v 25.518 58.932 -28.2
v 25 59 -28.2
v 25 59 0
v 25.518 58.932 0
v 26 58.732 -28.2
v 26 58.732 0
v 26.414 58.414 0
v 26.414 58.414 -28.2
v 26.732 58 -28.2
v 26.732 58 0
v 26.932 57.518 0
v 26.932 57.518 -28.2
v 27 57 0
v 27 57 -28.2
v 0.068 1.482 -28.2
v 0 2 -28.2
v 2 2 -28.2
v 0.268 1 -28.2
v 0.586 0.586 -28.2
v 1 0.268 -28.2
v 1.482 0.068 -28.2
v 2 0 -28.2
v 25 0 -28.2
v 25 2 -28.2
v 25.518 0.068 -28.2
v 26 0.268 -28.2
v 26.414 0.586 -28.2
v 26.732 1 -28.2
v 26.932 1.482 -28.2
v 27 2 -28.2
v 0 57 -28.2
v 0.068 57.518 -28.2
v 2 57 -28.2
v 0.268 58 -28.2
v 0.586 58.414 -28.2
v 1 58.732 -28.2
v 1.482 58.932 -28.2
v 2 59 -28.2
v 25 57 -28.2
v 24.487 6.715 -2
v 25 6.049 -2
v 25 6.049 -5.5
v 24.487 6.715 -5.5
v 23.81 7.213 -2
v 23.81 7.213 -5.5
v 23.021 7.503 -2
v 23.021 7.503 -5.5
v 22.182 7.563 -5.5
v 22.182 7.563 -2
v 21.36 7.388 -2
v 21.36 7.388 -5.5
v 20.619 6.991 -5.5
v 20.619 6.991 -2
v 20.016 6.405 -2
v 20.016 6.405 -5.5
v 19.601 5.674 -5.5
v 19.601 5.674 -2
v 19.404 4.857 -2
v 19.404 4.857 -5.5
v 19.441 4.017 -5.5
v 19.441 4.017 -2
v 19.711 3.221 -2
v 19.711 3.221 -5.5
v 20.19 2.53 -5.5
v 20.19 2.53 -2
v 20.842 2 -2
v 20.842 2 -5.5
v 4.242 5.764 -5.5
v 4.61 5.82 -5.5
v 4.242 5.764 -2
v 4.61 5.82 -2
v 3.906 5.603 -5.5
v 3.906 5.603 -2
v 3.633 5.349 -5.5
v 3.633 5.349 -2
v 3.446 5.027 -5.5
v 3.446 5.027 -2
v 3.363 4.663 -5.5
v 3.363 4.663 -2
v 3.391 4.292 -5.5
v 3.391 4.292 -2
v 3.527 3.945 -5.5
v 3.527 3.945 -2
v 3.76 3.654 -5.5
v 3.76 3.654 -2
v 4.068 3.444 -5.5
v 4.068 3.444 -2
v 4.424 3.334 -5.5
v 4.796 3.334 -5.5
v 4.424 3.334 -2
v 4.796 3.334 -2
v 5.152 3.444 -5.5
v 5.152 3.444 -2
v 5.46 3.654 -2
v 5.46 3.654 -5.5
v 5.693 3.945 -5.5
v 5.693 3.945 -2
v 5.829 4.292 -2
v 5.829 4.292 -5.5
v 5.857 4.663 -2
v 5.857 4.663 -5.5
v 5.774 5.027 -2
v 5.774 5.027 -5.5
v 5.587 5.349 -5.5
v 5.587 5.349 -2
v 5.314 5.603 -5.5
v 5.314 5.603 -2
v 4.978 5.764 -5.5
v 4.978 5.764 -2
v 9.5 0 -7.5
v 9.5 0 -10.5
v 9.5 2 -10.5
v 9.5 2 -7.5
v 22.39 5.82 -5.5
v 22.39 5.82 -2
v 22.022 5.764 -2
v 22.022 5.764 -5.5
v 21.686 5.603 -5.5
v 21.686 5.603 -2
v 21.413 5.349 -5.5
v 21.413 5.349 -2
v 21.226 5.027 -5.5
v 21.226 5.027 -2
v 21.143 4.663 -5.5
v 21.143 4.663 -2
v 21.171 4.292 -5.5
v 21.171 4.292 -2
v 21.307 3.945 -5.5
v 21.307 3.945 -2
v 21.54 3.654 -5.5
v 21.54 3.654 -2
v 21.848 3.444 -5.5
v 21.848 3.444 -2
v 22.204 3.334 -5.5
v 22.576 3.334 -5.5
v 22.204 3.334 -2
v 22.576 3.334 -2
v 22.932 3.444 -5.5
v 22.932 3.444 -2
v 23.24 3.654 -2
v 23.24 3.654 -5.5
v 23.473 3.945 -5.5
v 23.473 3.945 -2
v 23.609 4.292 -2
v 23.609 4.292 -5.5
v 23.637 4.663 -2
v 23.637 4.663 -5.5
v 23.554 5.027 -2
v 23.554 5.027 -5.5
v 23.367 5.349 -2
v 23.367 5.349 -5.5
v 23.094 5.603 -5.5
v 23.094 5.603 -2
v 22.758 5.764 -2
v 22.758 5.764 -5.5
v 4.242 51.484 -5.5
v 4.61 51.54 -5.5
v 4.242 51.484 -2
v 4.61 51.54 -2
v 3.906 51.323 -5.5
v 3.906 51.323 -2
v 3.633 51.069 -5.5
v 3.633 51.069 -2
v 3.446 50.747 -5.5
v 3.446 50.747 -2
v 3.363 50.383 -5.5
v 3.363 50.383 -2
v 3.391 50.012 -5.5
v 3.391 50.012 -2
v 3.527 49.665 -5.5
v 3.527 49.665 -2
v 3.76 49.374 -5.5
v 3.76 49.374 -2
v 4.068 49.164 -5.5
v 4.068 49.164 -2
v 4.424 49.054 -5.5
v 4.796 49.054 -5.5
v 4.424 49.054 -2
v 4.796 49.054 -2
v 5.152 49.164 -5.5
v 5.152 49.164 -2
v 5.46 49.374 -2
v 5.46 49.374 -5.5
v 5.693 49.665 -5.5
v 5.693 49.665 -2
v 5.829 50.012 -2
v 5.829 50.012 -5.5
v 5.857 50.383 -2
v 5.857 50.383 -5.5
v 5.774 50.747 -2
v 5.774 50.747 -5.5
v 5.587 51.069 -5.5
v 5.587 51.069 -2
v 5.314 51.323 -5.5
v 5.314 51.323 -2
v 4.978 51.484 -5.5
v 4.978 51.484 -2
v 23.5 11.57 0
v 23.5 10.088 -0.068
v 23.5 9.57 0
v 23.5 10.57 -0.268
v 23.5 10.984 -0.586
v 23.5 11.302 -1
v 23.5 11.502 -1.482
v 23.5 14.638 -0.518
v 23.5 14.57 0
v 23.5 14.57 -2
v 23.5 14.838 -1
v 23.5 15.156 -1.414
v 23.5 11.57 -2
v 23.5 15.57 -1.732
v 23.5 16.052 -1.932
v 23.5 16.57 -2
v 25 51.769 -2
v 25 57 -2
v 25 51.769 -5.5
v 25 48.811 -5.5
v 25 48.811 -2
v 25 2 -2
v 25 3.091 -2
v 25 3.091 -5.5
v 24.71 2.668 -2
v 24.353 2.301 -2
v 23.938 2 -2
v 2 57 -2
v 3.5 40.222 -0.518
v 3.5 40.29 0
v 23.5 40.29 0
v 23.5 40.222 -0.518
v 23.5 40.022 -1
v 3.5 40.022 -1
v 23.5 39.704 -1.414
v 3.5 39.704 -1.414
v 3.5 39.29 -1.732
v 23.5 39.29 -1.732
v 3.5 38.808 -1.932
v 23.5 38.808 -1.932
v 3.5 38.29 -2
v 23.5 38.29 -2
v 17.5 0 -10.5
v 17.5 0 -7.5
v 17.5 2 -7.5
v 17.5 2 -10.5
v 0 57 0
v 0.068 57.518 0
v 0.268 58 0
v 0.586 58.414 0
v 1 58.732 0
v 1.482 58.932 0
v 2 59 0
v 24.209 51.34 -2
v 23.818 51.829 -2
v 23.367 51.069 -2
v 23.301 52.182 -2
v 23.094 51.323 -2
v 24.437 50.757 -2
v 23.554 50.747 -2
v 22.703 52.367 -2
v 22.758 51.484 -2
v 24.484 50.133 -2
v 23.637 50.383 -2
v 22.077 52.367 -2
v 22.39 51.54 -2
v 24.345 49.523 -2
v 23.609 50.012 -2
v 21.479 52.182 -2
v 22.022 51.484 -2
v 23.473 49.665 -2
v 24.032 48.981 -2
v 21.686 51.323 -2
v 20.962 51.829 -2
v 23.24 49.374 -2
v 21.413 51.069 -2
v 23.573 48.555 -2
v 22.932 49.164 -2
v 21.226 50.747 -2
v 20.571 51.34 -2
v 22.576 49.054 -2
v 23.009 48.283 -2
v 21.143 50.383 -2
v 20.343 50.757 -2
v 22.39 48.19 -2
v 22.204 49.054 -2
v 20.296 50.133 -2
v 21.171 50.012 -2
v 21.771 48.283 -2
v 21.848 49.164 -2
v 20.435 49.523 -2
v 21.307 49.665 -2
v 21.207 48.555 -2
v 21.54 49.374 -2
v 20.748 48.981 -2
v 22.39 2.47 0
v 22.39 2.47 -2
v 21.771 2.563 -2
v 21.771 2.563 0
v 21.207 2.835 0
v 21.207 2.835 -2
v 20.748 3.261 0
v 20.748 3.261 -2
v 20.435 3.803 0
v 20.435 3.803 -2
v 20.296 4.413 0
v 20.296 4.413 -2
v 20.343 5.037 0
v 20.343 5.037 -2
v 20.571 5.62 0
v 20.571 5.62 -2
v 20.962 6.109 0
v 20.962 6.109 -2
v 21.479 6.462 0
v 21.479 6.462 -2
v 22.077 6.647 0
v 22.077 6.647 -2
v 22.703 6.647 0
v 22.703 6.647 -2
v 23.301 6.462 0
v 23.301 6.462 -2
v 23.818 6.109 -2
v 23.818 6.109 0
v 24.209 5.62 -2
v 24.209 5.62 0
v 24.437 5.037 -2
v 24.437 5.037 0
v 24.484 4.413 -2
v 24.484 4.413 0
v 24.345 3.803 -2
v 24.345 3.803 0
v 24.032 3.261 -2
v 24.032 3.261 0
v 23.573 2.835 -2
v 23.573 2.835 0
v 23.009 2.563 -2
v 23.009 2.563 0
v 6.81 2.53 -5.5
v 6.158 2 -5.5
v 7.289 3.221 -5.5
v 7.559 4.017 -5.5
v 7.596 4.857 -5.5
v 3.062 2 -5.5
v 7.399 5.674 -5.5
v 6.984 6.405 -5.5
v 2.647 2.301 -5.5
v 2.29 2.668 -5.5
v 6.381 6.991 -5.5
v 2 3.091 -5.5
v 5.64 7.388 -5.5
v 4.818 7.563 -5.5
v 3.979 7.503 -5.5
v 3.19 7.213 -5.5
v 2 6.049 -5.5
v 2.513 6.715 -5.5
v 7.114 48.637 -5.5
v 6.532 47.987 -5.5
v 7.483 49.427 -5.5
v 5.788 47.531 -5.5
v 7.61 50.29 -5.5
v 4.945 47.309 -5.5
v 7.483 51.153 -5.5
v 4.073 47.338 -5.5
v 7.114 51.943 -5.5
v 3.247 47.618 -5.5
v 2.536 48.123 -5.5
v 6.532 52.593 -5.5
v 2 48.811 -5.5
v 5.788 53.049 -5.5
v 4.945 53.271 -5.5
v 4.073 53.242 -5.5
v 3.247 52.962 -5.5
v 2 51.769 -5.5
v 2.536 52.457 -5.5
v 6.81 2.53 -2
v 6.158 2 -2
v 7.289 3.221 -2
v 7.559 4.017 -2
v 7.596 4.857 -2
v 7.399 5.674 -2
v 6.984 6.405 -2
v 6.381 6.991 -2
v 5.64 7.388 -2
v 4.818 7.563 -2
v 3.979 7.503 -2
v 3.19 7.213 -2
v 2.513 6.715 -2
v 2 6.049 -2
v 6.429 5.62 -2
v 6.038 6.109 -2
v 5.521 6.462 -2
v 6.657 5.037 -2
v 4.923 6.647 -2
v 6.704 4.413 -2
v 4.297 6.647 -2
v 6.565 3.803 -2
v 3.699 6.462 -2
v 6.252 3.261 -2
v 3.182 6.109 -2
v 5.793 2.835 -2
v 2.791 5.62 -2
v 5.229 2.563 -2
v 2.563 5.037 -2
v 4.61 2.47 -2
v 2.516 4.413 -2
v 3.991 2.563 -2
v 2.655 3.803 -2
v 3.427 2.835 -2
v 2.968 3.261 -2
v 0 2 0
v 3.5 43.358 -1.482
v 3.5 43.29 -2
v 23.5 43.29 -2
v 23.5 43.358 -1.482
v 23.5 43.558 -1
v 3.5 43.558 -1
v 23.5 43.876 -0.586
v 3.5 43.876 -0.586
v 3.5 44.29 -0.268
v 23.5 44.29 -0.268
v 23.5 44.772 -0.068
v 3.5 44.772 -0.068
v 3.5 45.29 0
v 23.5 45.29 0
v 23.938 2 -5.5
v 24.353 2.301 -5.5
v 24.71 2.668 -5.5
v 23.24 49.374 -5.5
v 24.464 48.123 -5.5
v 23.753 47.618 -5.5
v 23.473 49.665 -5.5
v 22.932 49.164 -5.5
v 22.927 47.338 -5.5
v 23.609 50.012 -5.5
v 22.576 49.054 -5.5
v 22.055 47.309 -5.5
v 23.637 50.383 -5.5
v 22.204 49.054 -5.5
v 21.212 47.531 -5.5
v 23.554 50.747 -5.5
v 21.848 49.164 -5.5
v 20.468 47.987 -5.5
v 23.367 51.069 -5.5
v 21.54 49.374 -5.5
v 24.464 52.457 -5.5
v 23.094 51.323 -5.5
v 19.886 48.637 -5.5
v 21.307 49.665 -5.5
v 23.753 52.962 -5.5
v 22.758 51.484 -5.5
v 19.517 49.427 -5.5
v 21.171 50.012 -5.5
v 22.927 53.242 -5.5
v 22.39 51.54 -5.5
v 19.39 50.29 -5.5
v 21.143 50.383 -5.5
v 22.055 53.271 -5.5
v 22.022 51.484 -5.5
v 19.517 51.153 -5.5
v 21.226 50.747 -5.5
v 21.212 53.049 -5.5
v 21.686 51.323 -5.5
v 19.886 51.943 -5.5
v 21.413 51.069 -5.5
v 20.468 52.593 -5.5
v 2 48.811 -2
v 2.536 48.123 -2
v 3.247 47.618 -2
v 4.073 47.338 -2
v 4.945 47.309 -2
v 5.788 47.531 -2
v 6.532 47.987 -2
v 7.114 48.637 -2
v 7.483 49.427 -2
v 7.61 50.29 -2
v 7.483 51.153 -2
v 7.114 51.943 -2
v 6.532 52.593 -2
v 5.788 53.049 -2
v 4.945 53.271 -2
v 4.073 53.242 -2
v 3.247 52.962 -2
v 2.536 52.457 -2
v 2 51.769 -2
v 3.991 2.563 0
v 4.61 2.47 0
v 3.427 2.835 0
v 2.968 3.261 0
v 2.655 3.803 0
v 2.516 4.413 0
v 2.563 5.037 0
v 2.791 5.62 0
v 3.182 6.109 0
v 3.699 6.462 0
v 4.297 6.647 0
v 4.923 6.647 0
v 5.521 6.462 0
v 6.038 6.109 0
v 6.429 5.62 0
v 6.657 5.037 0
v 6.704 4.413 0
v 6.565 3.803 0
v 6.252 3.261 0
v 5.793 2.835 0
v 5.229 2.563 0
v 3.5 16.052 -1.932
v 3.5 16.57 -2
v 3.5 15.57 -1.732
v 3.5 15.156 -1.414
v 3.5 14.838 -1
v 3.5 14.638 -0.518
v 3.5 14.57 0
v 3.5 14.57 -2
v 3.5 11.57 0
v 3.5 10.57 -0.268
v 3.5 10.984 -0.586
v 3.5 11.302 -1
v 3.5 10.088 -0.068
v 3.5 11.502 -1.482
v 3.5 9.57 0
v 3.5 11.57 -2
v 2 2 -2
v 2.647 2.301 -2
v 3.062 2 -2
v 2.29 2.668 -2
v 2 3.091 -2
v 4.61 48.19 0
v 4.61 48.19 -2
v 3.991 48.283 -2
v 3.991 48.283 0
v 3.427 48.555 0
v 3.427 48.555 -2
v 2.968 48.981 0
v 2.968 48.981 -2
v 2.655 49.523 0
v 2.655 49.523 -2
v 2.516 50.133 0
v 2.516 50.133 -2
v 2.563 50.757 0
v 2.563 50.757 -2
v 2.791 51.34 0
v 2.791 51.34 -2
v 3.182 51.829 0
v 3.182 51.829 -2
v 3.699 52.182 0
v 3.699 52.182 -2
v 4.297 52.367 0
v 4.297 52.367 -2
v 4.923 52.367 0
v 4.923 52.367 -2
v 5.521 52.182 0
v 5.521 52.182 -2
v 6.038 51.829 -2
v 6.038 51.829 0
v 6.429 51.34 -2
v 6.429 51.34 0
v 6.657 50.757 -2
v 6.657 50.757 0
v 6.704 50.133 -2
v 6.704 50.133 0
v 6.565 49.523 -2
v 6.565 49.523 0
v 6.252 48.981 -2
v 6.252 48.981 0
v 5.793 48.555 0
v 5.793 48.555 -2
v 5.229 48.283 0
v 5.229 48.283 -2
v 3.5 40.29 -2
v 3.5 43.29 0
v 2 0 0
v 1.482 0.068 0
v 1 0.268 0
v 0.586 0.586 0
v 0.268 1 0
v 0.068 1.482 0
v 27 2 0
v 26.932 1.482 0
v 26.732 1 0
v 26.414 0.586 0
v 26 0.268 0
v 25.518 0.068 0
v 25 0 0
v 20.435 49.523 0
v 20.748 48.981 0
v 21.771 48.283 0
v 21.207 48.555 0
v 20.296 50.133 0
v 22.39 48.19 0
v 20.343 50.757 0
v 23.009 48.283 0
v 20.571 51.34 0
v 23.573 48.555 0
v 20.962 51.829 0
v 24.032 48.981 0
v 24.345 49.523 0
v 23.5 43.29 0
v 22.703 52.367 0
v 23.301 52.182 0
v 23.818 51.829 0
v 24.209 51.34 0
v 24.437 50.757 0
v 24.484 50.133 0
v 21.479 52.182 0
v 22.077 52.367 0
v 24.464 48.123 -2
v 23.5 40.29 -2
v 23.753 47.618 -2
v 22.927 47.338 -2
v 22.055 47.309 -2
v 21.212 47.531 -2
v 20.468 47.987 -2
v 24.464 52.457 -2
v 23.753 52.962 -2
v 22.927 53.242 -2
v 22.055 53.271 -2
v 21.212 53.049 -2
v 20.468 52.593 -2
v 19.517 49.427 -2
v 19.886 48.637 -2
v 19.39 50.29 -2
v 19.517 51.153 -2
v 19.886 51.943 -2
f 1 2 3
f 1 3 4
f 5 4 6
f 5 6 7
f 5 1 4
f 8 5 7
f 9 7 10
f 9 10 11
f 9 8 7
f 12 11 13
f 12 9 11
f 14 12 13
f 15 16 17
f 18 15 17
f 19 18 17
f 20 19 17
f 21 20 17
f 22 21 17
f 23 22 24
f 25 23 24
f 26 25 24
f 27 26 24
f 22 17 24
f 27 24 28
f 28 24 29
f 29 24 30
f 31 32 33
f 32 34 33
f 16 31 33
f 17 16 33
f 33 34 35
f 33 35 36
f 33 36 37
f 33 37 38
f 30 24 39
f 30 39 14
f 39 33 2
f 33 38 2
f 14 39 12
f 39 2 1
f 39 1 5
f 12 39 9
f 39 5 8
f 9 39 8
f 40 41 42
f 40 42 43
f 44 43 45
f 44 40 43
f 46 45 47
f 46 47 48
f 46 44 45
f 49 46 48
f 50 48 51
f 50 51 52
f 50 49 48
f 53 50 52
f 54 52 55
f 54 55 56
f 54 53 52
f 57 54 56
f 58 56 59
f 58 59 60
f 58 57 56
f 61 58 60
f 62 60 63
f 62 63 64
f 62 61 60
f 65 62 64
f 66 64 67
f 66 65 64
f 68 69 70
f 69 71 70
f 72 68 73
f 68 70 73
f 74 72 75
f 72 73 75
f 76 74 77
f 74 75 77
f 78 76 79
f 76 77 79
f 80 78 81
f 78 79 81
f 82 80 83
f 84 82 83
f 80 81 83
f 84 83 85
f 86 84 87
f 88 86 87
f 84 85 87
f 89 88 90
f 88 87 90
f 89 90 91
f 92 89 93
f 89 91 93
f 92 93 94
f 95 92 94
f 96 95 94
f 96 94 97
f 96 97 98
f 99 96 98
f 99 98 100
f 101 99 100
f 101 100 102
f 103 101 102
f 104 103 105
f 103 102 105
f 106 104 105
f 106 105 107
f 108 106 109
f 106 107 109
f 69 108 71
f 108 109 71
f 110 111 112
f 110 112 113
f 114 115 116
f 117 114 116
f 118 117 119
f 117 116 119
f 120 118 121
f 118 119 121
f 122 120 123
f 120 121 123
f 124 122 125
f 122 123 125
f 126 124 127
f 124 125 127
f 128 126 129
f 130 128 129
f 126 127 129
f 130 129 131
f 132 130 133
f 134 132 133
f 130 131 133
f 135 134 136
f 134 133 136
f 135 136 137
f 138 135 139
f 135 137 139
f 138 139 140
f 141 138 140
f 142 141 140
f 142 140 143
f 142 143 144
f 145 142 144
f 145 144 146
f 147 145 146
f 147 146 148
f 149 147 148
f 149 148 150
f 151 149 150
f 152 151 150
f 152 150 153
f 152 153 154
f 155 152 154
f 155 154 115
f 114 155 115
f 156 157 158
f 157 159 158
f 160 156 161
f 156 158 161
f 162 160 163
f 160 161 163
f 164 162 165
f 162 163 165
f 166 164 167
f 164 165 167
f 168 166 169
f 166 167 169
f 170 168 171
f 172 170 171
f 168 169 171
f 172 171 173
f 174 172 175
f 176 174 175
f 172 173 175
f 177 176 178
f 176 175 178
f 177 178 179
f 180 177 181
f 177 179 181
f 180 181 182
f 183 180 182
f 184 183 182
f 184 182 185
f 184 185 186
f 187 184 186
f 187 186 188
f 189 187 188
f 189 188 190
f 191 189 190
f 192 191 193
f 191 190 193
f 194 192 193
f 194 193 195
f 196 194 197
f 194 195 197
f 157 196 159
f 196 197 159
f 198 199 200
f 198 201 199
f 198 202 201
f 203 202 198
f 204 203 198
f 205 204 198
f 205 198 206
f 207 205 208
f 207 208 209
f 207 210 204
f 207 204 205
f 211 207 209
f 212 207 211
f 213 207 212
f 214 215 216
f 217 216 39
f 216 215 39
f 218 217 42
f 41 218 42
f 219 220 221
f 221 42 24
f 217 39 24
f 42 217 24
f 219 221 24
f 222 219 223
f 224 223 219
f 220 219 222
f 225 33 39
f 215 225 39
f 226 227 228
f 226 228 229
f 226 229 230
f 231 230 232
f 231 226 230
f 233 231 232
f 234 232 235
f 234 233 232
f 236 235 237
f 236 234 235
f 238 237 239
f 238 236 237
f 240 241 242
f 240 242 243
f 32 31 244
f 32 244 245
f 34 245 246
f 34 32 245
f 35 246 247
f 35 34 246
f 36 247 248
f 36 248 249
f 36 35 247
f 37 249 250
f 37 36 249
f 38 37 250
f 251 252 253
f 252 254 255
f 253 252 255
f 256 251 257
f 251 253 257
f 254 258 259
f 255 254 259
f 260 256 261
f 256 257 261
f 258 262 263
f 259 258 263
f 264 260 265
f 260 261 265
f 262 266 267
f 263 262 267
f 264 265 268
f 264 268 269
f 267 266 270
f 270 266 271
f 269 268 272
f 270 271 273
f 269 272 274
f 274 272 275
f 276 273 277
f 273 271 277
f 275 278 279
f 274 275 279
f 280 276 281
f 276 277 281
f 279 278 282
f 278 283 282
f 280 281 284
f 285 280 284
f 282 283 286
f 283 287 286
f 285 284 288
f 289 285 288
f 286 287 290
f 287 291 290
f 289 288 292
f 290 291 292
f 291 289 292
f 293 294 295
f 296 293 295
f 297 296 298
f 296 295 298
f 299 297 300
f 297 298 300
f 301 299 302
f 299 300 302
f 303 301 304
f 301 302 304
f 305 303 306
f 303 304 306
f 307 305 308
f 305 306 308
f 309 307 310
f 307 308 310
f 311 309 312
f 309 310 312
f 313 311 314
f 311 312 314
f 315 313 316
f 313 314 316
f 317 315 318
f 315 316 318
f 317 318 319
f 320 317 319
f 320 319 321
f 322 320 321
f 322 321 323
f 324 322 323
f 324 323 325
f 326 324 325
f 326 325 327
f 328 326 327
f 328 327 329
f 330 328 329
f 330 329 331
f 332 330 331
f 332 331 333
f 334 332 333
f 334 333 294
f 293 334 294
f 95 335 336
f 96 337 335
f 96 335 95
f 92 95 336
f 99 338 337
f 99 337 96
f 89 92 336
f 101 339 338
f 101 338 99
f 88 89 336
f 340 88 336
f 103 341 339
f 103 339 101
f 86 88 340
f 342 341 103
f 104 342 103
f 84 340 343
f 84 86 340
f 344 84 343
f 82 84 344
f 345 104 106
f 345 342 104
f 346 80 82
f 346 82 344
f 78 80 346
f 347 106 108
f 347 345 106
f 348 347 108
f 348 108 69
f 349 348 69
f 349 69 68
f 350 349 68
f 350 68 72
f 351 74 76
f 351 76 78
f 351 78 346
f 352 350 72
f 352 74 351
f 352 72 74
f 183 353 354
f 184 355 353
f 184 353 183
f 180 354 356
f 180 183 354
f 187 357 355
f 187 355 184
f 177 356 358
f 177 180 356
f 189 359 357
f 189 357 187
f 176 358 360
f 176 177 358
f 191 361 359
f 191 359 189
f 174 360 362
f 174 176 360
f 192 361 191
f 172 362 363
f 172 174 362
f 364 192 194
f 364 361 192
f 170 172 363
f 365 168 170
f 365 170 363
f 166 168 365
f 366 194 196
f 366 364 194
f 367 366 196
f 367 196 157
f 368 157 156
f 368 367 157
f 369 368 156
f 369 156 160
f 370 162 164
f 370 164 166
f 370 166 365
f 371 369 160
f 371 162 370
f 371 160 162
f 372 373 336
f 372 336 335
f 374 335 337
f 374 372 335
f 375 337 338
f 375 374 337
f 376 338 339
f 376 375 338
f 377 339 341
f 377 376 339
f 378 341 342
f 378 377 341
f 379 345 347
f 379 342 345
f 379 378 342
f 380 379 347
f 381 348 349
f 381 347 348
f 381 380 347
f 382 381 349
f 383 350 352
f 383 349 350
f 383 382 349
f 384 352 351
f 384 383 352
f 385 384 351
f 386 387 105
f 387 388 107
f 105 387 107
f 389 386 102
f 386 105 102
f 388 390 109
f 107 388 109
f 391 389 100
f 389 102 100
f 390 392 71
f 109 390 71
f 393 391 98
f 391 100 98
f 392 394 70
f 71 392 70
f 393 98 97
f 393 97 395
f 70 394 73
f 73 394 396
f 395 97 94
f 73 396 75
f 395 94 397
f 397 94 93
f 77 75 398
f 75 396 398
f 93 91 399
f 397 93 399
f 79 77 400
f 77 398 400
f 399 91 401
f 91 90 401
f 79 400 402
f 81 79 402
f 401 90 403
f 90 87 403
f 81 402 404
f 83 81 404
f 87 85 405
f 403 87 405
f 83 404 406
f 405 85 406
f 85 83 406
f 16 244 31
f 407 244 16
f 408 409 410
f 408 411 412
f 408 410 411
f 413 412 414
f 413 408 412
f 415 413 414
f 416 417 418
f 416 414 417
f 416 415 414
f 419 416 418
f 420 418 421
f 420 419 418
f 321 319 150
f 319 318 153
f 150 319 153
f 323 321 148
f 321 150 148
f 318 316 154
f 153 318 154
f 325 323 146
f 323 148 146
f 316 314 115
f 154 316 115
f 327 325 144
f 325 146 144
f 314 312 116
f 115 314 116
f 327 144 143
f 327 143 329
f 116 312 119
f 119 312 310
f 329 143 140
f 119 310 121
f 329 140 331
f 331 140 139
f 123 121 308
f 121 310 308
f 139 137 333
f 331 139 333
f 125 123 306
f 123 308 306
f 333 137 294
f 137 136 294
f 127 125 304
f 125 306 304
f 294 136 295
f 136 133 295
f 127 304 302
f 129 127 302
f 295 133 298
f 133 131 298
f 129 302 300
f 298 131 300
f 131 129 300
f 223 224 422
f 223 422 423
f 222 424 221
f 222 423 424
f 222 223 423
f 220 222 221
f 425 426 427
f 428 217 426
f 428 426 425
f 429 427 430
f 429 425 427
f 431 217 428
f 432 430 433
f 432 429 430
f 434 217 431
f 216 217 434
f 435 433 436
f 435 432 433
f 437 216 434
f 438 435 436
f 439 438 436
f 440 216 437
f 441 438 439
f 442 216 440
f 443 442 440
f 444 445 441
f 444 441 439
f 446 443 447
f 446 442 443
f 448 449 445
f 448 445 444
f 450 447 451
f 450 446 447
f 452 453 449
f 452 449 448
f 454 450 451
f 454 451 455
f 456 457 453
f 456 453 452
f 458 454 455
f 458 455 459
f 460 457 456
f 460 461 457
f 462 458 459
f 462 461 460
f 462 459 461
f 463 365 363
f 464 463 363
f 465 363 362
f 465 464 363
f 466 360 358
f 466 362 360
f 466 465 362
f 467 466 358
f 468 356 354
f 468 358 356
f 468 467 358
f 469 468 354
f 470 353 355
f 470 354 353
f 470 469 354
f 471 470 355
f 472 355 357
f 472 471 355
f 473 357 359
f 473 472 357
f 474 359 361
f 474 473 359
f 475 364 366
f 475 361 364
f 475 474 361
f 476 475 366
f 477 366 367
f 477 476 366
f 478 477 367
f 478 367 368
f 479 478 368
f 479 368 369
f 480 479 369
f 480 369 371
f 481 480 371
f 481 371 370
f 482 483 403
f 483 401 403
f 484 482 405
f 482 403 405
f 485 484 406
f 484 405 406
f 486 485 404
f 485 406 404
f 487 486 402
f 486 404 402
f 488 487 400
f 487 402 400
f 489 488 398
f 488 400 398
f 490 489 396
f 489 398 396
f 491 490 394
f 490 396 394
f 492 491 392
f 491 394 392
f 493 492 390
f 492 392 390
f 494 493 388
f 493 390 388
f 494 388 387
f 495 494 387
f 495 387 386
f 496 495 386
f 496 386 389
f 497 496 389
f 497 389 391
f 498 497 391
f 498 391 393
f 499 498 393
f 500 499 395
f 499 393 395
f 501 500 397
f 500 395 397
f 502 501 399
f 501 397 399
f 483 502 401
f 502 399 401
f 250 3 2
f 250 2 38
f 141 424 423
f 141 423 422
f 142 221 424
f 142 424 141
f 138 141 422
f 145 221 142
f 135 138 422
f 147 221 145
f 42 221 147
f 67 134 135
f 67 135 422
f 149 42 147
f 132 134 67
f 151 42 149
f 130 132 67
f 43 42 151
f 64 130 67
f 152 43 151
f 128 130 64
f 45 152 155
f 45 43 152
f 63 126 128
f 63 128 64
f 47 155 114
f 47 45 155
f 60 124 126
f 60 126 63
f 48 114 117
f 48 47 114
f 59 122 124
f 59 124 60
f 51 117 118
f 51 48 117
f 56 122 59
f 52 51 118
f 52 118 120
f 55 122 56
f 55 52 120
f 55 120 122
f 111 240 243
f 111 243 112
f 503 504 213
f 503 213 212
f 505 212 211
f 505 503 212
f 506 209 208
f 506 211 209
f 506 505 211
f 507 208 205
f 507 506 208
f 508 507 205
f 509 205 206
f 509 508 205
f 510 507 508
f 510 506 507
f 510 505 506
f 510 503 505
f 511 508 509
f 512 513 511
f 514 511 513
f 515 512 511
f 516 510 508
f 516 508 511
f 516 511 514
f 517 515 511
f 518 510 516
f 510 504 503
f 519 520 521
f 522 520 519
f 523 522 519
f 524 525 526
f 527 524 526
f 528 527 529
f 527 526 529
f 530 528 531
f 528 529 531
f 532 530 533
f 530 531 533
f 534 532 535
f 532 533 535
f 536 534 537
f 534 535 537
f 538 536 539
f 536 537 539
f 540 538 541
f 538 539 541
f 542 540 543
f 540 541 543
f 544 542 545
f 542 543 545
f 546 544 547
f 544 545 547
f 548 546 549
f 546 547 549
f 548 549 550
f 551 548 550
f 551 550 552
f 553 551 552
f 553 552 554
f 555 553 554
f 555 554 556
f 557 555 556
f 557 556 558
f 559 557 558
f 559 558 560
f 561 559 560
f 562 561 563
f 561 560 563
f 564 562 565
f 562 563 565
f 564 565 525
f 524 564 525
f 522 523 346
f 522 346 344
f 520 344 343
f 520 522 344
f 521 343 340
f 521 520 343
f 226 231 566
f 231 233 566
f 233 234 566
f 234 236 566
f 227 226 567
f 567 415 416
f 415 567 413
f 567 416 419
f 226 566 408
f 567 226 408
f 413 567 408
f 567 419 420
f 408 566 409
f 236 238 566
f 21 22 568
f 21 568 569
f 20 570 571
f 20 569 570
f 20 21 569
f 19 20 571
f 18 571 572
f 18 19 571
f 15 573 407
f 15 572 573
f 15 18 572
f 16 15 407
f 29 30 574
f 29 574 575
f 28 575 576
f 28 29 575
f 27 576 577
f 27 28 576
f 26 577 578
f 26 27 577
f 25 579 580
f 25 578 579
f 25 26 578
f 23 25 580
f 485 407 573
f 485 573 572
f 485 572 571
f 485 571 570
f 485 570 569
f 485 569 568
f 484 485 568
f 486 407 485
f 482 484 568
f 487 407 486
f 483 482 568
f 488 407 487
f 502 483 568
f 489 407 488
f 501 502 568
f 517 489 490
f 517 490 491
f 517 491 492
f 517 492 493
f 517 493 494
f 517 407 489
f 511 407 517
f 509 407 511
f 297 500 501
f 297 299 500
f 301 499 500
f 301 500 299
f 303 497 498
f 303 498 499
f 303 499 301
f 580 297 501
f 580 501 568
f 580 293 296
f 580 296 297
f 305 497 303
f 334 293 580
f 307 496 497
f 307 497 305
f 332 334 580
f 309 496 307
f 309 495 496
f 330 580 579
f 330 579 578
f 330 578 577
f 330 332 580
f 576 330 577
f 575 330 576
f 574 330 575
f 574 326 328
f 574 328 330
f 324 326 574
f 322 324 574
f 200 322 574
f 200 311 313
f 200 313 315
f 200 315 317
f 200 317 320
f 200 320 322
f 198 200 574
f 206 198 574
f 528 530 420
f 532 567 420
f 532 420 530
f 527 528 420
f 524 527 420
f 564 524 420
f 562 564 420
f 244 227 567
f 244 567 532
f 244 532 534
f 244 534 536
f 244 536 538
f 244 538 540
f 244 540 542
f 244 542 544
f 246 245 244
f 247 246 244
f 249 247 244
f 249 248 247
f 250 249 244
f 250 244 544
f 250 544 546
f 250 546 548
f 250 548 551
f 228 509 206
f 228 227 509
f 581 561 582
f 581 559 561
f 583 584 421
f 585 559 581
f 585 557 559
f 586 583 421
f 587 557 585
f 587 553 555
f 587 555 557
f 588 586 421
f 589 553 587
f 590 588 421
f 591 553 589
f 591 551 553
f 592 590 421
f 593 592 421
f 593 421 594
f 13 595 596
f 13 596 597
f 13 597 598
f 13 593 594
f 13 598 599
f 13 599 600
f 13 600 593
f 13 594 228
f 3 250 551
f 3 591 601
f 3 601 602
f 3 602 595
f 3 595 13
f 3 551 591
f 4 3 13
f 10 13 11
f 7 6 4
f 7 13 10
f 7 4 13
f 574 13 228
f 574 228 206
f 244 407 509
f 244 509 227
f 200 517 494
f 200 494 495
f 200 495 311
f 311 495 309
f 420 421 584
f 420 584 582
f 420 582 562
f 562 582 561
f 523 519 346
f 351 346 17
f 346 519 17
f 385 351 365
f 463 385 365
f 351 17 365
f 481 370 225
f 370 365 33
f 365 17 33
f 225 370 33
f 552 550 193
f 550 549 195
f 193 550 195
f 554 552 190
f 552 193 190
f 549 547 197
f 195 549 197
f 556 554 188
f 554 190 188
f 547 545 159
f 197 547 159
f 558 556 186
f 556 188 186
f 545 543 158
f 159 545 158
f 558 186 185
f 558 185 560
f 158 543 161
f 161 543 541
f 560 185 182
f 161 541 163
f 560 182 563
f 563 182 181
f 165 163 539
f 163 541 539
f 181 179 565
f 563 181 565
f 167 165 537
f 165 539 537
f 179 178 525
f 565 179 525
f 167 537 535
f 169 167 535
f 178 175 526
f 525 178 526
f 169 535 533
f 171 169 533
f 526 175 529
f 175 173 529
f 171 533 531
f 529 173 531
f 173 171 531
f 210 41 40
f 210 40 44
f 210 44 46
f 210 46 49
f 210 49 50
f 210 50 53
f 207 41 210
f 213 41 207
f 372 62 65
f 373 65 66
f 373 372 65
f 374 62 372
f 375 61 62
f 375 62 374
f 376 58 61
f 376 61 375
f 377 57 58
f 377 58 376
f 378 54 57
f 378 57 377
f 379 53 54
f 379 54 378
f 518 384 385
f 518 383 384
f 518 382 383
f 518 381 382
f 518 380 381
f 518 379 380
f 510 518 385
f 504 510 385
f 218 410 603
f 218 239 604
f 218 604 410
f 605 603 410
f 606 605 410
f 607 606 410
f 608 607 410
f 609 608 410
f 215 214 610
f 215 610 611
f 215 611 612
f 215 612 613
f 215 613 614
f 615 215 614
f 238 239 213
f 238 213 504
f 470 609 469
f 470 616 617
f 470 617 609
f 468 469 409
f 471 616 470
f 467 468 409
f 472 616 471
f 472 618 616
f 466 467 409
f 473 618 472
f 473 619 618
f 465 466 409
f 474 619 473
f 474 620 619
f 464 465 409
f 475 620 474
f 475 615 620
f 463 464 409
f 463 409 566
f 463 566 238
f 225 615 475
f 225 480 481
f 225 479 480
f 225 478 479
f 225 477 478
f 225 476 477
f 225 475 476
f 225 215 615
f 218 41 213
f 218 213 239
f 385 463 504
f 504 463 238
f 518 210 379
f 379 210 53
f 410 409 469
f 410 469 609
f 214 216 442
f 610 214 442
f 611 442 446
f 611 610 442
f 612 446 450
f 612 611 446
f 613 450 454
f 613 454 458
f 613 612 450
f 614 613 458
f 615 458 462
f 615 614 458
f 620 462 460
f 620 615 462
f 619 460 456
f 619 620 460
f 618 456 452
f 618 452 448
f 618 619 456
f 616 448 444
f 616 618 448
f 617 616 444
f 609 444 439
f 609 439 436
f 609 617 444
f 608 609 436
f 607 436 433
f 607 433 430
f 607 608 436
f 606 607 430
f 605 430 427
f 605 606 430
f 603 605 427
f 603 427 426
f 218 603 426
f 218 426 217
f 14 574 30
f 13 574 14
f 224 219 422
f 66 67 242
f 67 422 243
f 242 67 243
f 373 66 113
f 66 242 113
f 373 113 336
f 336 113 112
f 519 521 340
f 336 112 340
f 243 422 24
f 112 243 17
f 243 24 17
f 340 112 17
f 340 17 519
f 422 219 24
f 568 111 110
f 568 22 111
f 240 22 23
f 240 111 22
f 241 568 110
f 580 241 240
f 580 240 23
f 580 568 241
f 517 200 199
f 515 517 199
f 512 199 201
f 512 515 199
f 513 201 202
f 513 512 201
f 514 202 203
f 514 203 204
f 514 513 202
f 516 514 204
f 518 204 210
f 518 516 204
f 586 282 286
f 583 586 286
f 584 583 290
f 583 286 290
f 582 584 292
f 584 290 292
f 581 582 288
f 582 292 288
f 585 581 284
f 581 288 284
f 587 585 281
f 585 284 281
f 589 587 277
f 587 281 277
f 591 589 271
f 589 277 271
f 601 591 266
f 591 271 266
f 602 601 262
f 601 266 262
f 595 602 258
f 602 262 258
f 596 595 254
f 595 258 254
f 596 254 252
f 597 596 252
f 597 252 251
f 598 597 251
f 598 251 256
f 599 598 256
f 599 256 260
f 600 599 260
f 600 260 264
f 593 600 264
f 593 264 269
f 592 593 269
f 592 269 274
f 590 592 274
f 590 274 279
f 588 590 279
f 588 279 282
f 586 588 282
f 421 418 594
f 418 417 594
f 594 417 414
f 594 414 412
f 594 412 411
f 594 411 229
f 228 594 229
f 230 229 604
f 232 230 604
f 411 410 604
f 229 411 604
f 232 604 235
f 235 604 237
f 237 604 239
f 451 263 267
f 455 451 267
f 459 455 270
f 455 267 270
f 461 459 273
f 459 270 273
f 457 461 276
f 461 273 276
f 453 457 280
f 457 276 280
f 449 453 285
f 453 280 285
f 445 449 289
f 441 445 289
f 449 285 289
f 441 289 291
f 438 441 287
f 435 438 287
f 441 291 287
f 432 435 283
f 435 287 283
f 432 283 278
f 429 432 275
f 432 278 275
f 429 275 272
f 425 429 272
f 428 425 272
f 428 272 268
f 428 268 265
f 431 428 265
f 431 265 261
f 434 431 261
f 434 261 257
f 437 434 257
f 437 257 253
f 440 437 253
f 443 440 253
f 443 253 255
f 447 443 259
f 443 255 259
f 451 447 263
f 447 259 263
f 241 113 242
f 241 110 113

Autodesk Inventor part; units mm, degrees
ref_plane "YZ Plane" through (0, 0, 0) normal (1, 0, 0) x (0, 1, 0)
ref_plane "XZ Plane" through (0, 0, 0) normal (0, 1, 0) x (-1, 0, 0)
ref_plane "XY Plane" through (0, 0, 0) normal (0, 0, 1) x (1, 0, 0)
sketch "Skizze1" plane through (0, 0, 0) normal (0, 0, 1) x (1, 0, 0)
  line L0 (0, 0) -> (27, 0)
  line L1 (27, 0) -> (27, 59)
  line L2 (27, 59) -> (0, 59)
  line L3 (0, 59) -> (0, 0)
  dimension "d0" = 27
  dimension "d1" = 59
extrude "Extrusion1" add sketch "Skizze1" against normal blind 28.2
sketch "Skizze2" plane through (0, 0, -28.2) normal (0, 0, -1) x (-1, 0, 0)
  line L0 (-2, 57) -> (-25, 57)
  line L1 (-25, 57) -> (-25, 2)
  line L2 (-25, 2) -> (-2, 2)
  line L3 (-2, 2) -> (-2, 57)
  line L4 (0, 59) -> (-27, 59) construction
  line L5 (-27, 59) -> (-27, 0) construction
  point P0 (0, 0)
  dimension "d4" = 2
  dimension "d5" = 2
  dimension "d6" = 2
  dimension "d7" = 2
extrude "Extrusion2" cut sketch "Skizze2" against normal blind 26.2
sketch "Skizze3" plane through (0, 0, -2) normal (0, 0, -1) x (-1, 0, 0)
  circle A0 centre (-4.61, 4.57) radius 3
  line L0 (-2, 2) -> (-25, 2) construction
  line L1 (-2, 57) -> (-2, 2) construction
  circle A1 centre (-22.39, 4.57) radius 3
  circle A2 centre (-4.61, 50.29) radius 3
  circle A3 centre (-22.39, 50.29) radius 3
  line L2 (-4.61, 4.57) -> (-22.39, 4.57) construction
  point P0 (0, 0)
  point P1 (-13.5, 4.57)
  point P2 (-13.5, 2)
  dimension "d13" = 6
  dimension "d18" = 17.78
  dimension "d21" = 45.72
  dimension "d66" = 2.57
extrude "Extrusion4" add sketch "Skizze3" along normal blind 3.5
sketch "Skizze7" plane through (4.61, 50.29, -5.5) normal (0, 0, -1) x (0, -1, 0)
  circle A0 centre (0, 0) radius 3 construction
  circle A1 centre (0, -17.78) radius 3 construction
  circle A2 centre (45.72, -17.78) radius 3 construction
  circle A3 centre (45.72, 0) radius 3 construction
  point P0 (50.29, 4.61)
  point P1 (0, -17.78)
  point P2 (45.72, 0)
hole "Bohrung2" at (4.61, 50.29, -5.5) at (22.39, 50.29, -5.5) at (22.39, 4.57, -5.5) at (4.61, 4.57, -5.5) direction (0, 0, 1) diameter 2.5 end through all
sketch "Skizze8" plane through (0, 0, -2) normal (0, 0, -1) x (-1, 0, 0)
  line L0 (-3.5, 11.57) -> (-23.5, 11.57)
  line L1 (-23.5, 11.57) -> (-23.5, 14.57)
  line L2 (-23.5, 14.57) -> (-3.5, 14.57)
  line L3 (-3.5, 14.57) -> (-3.5, 11.57)
  line L4 (-2, 2) -> (-25, 2) construction
  circle A0 centre (-4.61, 4.57) radius 3 construction
  line L5 (-3.5, 43.29) -> (-23.5, 43.29)
  line L6 (-23.5, 43.29) -> (-23.5, 40.29)
  line L7 (-23.5, 40.29) -> (-3.5, 40.29)
  line L8 (-3.5, 40.29) -> (-3.5, 43.29)
  circle A1 centre (-4.61, 50.29) radius 3 construction
  point P0 (0, 0)
  point P1 (-13.5, 11.57)
  point P2 (-13.5, 2)
  point P3 (-13.5, 2)
  point P4 (-13.5, 40.29)
  dimension "d43" = 3
  dimension "d44" = 20
  dimension "d45" = 4
  dimension "d46" = 3
  dimension "d47" = 20
  dimension "d48" = 4
extrude "Extrusion5" cut sketch "Skizze8" against normal through all
sketch "Skizze9" plane through (0, 0, 0) normal (0, -1, 0) x (1, 0, 0)
  line L0 (2, -5.5) -> (3.0624, -5.5) construction
  line L1 (17.5, -10.5) -> (9.5, -10.5)
  line L2 (9.5, -10.5) -> (9.5, -7.5)
  line L3 (9.5, -7.5) -> (17.5, -7.5)
  line L4 (17.5, -7.5) -> (17.5, -10.5)
  line L5 (0, 0) -> (27, 0) construction
  point P0 (13.5, -7.5)
  point P1 (13.5, 0)
  dimension "d54" = 8
  dimension "d55" = 3
  dimension "d56" = 2
extrude "Extrusion6" cut sketch "Skizze9" against normal up to surface (2 mm away)
sketch "Skizze10" plane through (0, 0, 0) normal (0, 0, 1) x (1, 0, 0)
  circle A0 centre (4.61, 4.57) radius 1.25 construction
  circle A1 centre (22.39, 4.57) radius 1.25 construction
  circle A2 centre (22.39, 50.29) radius 1.25 construction
  circle A3 centre (4.61, 50.29) radius 1.25 construction
  point P0 (0, 0)
hole "Bohrung3" at (4.61, 4.57, 0) at (22.39, 4.57, 0) at (22.39, 50.29, 0) at (4.61, 50.29, 0) direction (0, 0, -1) diameter 2.5 end through all counterbore diameter 4.2 counterbore depth 2
fillet "Rundung1" radius 2 4 edges at (27, 0, -14.1) (0, 0, -14.1) (0, 59, -14.1) (27, 59, -14.1)
fillet "Rundung2" radius 2 2 edges at (13.5, 14.57, -2) (13.5, 40.29, -2)
fillet "Rundung3" radius 2 2 edges at (13.5, 11.57, 0) (13.5, 43.29, 0)
properties part number "bottom"
